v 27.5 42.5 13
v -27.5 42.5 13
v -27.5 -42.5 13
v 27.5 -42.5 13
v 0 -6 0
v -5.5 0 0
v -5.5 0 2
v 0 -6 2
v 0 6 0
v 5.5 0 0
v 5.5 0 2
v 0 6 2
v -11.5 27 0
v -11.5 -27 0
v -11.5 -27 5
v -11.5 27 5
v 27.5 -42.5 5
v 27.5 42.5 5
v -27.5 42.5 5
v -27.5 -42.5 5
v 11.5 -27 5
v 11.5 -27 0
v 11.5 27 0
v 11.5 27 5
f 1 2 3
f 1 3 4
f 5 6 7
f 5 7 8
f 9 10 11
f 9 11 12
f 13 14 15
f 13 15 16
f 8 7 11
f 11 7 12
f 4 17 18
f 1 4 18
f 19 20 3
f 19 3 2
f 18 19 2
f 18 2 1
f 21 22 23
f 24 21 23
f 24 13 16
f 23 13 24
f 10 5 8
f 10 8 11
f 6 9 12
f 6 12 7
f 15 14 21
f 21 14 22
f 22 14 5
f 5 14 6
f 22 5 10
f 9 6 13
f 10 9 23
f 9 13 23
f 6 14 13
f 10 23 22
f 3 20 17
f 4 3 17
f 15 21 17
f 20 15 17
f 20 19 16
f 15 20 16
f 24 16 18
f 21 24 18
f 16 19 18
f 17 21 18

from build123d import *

# Parameters (mm, degrees)
SKETCH_1_W      = 23
SKETCH_1_H      = 54
EXTRUDE_1_DEPTH = 5
EXTRUDE_2_DEPTH = 3
SKETCH_3_W      = 55
SKETCH_3_H      = 85
EXTRUDE_3_DEPTH = 8


with BuildPart() as part:
    # 草图1 → 凸台-拉伸1 (new body)
    with BuildSketch(Plane.XY):
        Rectangle(SKETCH_1_W, SKETCH_1_H)
        Polygon((0, 6), (-5.5, 0), (0, -6), (5.5, 0), align=None, mode=Mode.SUBTRACT)
    extrude(amount=EXTRUDE_1_DEPTH)

    # 草图2 → 凸台-拉伸2 (add)
    with BuildSketch(Plane.XY.offset(5)):
        Polygon((0, -6), (5.5, 0), (0, 6), (-5.5, 0), align=None)
    extrude(amount=-EXTRUDE_2_DEPTH)

    # 草图3 → 凸台-拉伸3 (add)
    with BuildSketch(Plane.XY.offset(5)):
        Rectangle(SKETCH_3_W, SKETCH_3_H)
    extrude(amount=EXTRUDE_3_DEPTH)


solid = part.part
